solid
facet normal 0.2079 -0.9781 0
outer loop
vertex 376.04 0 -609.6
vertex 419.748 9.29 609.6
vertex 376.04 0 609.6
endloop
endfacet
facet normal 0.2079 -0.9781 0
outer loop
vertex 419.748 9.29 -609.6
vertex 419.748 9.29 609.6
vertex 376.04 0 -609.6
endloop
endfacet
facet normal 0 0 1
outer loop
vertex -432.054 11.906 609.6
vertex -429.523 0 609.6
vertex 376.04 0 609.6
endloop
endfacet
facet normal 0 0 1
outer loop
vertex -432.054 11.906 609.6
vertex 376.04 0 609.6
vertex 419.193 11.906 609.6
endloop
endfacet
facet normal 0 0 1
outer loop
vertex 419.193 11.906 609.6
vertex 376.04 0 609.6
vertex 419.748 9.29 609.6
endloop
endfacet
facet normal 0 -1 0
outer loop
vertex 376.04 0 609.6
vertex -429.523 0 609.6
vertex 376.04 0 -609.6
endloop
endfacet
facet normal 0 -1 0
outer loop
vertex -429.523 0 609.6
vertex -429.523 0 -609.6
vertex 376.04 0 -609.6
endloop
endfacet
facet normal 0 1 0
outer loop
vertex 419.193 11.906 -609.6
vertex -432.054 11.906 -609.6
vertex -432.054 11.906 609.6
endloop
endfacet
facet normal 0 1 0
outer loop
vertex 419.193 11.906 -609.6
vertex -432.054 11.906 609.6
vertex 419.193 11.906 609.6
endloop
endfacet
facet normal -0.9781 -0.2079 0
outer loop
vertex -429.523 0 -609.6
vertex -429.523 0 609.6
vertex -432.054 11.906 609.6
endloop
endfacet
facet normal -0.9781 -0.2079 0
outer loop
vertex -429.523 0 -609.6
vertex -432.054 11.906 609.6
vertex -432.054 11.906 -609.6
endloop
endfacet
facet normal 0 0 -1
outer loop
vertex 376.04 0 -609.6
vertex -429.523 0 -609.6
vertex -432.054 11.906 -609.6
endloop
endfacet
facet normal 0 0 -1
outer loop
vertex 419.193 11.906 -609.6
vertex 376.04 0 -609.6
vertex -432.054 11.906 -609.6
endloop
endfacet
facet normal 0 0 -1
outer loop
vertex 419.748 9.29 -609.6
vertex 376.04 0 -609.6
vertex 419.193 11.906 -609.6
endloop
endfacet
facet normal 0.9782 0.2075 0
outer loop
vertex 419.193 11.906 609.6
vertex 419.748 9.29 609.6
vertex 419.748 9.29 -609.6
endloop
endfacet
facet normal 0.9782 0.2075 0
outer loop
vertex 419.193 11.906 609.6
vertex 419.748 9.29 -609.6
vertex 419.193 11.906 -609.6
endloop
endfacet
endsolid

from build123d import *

# Parameters (mm, degrees)
SKETCH2_W              = 864.108
SKETCH2_H              = 1219.2
BOSS_EXTRUDE1_DEPTH    = 11.90625
CHAMFER6_SIZE2         = 2.530751562
CHAMFER6_SIZE          = 11.90625
CHAMFER7_SIZE2         = 11.90625
CHAMFER7_SIZE          = 56.014502241
CUT_EXTRUDE1_START     = 412.535124419
CUT_EXTRUDE1_OUTLINE_W = 6
CUT_EXTRUDE1_OUTLINE_H = 1222
CUT_EXTRUDE1_DEPTH     = 12.581416982


# Read off the part's stored shape, not the designer's step: Cut-Extrude1
with BuildPart() as part:
    # Sketch2 → Boss-Extrude1 (new body)
    with BuildSketch(Plane(origin=(0, 0, 0), x_dir=(1, 0, 0), z_dir=(0, 1, 0))):
        Rectangle(SKETCH2_W, SKETCH2_H)
    extrude(amount=BOSS_EXTRUDE1_DEPTH)

    # Chamfer6
    chamfer6_edges = [part.edges().sort_by_distance(p)[0] for p in [
        (-432.054, 0, 0),
    ]]
    chamfer6_side = [part.faces().sort_by_distance(p)[0] for p in [
        (-432.054, 0.050615031, 0),
    ]]
    chamfer(chamfer6_edges, length=CHAMFER6_SIZE - 0.0001, length2=CHAMFER6_SIZE2 - 0.0001, reference=chamfer6_side[0])  # a hair under: the kernel refuses the full size

    # Chamfer7
    chamfer7_edges = [part.edges().sort_by_distance(p)[0] for p in [
        (432.054, 0, 0),
    ]]
    chamfer7_side = [part.faces().sort_by_distance(p)[0] for p in [
        (431.815875, 0, 0),
    ]]
    chamfer(chamfer7_edges, length=CHAMFER7_SIZE - 0.0001, length2=CHAMFER7_SIZE2 - 0.0001, reference=chamfer7_side[0])  # a hair under: the kernel refuses the full size

    # Cut-Extrude1 outline → Cut-Extrude1 (cut)
    with BuildSketch(Plane(origin=(0, 0, 0), x_dir=(-0.20755464226928605, 0.978223425640824, 0), z_dir=(0.9782234256408241, 0.20755464226928602, 0)).offset(CUT_EXTRUDE1_START)):
        with Locations((-77, 0)):
            Rectangle(CUT_EXTRUDE1_OUTLINE_W, CUT_EXTRUDE1_OUTLINE_H)
    extrude(amount=CUT_EXTRUDE1_DEPTH, mode=Mode.SUBTRACT)


solid = part.part
